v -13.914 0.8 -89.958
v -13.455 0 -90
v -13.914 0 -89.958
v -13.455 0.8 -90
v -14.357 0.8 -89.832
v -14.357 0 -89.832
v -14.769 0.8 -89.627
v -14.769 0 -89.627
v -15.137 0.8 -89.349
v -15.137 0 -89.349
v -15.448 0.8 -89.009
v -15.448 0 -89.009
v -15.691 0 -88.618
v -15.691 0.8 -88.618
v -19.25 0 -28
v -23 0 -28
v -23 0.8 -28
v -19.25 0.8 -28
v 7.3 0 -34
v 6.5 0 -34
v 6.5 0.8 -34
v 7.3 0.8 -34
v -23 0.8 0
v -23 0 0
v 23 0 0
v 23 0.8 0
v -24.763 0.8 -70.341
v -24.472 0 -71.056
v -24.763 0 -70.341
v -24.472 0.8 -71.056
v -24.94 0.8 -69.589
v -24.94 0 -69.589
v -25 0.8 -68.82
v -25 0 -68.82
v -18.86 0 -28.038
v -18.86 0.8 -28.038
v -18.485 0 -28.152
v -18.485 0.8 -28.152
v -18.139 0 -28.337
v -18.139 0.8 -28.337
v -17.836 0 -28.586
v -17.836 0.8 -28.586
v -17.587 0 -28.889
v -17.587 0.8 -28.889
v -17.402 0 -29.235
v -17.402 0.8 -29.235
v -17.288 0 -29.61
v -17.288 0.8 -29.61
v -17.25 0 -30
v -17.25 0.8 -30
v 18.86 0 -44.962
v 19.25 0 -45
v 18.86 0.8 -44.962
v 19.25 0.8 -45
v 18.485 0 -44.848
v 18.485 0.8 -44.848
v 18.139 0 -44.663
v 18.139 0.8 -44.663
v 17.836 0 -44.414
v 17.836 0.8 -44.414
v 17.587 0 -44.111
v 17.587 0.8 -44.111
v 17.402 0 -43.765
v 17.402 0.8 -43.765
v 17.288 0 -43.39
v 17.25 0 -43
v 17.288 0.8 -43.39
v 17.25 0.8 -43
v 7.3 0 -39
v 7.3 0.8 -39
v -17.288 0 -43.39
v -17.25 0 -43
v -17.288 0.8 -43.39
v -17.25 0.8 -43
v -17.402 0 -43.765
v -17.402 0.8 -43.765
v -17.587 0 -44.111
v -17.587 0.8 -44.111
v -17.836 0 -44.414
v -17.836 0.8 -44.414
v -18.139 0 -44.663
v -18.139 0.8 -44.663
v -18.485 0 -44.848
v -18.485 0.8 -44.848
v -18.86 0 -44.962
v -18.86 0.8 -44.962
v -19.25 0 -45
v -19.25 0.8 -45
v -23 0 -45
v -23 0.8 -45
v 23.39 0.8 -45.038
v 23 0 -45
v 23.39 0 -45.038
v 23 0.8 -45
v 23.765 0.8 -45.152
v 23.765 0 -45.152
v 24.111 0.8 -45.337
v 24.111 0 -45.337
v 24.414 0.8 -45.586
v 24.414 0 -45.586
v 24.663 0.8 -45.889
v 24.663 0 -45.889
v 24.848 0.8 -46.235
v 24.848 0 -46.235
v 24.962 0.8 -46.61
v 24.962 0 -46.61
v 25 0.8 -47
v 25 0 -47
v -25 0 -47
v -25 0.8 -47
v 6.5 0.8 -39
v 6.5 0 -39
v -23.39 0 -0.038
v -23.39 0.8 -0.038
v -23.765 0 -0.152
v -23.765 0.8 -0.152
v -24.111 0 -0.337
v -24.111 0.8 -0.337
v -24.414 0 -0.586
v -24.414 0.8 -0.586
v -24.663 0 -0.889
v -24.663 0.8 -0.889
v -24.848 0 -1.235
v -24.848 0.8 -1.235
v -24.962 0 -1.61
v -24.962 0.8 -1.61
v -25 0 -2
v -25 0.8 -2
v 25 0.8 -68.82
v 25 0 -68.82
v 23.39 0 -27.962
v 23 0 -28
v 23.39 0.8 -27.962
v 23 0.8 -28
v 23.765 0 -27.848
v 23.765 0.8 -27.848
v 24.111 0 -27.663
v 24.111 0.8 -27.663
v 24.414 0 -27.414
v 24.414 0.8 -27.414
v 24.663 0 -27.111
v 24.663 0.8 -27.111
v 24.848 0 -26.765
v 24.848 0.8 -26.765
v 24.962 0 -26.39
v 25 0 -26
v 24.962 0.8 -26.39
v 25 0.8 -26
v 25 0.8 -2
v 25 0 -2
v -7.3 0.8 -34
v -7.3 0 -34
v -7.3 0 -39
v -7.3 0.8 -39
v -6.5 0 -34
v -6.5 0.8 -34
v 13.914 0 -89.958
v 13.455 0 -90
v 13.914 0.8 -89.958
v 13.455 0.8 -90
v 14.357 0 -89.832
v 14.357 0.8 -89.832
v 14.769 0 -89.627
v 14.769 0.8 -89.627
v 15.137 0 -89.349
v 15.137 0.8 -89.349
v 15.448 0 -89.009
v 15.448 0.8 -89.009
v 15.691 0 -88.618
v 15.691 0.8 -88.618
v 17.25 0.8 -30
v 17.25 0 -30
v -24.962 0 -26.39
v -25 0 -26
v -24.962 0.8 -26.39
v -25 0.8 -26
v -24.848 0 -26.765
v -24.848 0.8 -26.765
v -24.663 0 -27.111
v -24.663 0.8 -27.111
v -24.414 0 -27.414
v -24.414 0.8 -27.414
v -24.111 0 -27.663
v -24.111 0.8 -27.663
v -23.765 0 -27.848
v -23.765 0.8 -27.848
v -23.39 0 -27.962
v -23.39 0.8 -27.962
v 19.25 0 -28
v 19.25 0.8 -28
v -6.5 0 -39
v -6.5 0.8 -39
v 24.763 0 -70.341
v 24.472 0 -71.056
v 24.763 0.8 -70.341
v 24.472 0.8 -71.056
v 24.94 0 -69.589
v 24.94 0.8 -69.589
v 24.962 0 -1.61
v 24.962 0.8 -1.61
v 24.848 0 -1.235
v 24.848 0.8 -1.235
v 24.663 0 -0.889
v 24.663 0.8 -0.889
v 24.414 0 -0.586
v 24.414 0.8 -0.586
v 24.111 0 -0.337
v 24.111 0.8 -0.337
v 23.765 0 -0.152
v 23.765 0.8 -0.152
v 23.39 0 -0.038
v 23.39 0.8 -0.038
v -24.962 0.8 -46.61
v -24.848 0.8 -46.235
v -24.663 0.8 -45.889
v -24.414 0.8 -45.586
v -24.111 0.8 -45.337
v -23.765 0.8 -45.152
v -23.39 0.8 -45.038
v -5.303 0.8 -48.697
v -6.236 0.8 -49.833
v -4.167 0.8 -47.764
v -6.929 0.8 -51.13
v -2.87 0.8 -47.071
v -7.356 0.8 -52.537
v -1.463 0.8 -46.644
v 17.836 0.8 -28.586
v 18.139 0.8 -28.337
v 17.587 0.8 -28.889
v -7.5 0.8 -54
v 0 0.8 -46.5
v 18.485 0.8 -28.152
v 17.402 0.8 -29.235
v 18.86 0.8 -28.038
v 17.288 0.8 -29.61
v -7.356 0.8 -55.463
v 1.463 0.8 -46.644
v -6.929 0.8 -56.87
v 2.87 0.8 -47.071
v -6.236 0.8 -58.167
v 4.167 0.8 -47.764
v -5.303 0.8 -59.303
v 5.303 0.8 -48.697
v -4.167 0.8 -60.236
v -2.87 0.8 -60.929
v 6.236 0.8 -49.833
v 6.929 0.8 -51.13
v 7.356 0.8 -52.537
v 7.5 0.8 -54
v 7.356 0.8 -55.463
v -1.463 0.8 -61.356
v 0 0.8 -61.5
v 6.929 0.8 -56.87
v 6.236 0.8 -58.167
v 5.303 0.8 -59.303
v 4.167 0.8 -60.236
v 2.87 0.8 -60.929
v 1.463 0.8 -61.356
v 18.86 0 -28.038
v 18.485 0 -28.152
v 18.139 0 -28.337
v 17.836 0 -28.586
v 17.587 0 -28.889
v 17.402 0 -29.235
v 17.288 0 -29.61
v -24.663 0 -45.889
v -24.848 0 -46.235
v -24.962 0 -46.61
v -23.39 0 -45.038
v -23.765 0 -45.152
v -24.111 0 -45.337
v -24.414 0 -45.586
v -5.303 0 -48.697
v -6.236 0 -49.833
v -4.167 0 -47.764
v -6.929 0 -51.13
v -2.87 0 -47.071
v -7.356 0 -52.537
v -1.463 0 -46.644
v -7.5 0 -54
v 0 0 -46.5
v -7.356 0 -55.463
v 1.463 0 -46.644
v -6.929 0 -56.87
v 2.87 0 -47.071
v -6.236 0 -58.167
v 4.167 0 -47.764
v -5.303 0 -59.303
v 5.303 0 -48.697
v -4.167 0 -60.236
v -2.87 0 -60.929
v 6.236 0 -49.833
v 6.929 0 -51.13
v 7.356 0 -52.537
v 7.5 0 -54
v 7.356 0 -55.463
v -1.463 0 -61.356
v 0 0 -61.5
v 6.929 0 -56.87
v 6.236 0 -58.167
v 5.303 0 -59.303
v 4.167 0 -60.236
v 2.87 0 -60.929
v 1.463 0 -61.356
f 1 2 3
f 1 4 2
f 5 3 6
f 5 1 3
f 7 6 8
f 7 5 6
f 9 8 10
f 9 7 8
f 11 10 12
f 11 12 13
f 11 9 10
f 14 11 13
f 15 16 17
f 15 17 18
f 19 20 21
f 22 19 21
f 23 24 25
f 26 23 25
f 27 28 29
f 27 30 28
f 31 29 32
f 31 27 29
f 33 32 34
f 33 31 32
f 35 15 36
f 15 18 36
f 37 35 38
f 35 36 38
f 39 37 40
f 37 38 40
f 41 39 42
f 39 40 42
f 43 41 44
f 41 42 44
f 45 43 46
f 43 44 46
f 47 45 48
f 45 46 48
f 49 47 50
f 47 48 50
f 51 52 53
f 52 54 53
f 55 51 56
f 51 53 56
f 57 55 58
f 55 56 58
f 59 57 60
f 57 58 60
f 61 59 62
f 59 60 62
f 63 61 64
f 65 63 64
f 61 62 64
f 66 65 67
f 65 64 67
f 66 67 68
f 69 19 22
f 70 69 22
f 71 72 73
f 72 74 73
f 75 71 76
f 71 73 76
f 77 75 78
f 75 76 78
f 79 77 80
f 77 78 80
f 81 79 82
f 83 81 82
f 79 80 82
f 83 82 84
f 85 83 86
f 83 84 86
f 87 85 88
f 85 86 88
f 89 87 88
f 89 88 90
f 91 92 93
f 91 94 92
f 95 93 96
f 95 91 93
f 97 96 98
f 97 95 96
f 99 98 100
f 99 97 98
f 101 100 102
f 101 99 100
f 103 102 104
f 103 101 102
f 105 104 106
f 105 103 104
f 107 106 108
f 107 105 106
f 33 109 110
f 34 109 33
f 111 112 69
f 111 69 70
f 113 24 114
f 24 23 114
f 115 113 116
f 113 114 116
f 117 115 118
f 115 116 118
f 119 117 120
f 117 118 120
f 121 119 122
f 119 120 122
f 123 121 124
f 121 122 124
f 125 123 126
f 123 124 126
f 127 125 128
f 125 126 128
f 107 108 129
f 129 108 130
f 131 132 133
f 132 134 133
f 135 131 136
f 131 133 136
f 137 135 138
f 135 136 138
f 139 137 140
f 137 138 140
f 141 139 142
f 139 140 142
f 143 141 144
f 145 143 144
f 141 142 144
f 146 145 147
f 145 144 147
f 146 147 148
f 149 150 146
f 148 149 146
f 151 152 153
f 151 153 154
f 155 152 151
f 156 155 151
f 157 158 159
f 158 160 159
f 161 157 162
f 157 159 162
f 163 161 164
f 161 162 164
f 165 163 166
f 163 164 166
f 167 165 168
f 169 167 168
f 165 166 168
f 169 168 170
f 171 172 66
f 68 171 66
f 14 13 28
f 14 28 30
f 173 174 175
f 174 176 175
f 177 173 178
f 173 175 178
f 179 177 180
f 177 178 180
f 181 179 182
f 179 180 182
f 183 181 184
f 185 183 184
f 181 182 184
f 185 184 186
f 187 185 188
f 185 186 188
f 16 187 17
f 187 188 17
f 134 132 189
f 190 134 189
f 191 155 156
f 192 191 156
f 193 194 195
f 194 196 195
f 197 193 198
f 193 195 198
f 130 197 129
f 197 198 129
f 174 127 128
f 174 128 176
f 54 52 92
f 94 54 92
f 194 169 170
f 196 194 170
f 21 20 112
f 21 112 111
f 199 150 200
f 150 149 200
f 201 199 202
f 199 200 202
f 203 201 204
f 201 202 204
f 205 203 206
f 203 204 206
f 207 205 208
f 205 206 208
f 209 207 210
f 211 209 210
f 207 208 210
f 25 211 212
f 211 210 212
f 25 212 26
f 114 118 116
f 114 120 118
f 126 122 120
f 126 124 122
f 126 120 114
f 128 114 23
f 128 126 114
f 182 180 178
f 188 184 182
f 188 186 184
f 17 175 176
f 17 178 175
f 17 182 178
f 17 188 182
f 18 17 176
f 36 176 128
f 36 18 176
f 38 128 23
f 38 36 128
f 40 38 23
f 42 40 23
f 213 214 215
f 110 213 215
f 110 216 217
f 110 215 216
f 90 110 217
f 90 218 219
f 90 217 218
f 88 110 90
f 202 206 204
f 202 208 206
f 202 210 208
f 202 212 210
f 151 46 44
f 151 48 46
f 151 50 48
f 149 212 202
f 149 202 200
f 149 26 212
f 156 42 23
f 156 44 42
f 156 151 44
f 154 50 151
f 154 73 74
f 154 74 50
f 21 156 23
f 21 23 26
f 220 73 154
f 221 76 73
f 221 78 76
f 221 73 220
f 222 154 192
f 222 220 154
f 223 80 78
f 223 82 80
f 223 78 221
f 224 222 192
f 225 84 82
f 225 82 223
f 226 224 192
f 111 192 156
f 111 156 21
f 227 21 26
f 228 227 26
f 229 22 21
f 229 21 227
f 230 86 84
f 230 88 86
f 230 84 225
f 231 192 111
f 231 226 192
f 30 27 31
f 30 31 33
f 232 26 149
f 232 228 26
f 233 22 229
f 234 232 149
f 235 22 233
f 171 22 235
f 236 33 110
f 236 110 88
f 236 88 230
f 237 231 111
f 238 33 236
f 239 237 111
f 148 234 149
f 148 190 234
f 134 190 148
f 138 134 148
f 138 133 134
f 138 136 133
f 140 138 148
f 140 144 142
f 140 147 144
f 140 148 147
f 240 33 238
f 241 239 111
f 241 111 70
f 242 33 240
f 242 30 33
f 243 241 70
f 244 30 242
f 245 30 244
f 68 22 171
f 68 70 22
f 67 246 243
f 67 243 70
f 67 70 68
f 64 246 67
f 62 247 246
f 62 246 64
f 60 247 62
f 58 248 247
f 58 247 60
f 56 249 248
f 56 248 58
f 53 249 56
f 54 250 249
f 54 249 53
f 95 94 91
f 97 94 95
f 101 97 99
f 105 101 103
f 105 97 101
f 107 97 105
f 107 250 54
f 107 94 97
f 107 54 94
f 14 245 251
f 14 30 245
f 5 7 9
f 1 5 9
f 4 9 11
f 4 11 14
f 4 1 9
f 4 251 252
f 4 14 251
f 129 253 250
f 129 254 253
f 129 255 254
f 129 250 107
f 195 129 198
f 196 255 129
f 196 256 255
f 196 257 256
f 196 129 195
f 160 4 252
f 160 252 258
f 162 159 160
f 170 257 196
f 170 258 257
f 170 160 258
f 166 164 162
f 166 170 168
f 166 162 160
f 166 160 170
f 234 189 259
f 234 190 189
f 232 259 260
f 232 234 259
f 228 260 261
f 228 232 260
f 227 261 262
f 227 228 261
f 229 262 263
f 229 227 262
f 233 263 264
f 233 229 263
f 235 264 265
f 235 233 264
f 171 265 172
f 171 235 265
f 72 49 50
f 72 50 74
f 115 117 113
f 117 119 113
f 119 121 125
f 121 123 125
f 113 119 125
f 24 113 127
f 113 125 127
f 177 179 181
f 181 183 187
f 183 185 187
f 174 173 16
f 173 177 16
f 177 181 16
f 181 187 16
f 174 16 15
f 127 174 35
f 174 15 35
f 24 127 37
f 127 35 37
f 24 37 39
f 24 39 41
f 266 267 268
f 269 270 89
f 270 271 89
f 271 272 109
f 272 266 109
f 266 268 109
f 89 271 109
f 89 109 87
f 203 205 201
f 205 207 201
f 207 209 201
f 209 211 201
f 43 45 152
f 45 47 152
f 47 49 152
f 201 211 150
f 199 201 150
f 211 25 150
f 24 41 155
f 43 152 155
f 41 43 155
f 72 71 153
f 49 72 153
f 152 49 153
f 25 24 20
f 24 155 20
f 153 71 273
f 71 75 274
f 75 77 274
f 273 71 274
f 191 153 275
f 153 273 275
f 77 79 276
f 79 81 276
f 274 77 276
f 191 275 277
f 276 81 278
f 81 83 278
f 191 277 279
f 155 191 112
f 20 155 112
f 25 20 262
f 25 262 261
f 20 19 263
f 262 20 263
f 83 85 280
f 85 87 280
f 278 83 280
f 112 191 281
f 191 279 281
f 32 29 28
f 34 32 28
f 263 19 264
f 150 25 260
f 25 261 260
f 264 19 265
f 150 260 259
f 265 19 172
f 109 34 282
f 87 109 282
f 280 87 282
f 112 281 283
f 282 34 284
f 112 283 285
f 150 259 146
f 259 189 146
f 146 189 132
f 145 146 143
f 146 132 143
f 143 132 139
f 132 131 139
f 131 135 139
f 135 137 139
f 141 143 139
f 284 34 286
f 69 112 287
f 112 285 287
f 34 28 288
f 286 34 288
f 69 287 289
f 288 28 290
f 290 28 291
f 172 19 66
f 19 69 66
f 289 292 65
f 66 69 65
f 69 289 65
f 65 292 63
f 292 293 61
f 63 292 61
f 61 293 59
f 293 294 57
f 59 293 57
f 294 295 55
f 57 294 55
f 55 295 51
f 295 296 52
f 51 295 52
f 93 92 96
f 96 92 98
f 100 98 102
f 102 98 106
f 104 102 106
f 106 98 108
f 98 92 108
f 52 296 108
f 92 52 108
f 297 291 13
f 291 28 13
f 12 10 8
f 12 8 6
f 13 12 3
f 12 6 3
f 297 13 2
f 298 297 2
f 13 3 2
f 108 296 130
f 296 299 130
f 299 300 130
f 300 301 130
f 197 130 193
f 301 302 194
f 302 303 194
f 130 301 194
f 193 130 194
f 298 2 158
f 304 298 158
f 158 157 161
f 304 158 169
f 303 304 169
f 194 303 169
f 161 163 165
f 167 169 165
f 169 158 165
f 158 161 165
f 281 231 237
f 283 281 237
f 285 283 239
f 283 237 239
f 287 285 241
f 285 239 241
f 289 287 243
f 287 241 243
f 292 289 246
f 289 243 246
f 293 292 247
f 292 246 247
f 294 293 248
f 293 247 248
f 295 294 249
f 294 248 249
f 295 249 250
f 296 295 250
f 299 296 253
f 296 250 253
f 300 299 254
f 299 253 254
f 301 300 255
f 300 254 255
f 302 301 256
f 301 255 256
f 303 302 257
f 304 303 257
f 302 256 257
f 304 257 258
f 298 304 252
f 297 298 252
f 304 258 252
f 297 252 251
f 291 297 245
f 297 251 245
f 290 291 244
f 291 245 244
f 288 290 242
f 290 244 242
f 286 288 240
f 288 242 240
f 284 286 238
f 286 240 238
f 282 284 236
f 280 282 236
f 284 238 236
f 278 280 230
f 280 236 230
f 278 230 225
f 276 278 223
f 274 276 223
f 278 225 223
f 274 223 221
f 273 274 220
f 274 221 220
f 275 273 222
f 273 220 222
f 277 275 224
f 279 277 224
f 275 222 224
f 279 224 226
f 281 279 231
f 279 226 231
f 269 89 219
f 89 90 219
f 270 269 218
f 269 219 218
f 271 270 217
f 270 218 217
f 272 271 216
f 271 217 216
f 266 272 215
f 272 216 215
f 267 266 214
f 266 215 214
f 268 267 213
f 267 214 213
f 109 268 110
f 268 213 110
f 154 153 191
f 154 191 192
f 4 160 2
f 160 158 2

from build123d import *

# Parameters (mm, degrees)
RESSALTO_EXTRUS_O1_DEPTH = 0.8
FILETE6_R                = 2
CHANFRO3_SIZE            = 10
CHANFRO3_SIZE2           = 20
CHANFRO4_SIZE            = 20
CHANFRO4_SIZE2           = 10
FILETE7_R                = 2.5
ESBO_O7_R                = 7.5
CORTE_EXTRUS_O1_DEPTH    = 0.8
CAVIDADE1_START          = -7.3
CAVIDADE1_OUTLINE_W      = 0.8
CAVIDADE1_OUTLINE_H      = 5
CAVIDADE1_DEPTH          = 0.8
CAVIDADE1_START_2        = 6.5
CAVIDADE1_2_OUTLINE_W    = 0.8
CAVIDADE1_2_OUTLINE_H    = 5
CAVIDADE1_2_DEPTH        = 0.8
FILETE8_R                = 5


# Read off the part's stored shape, not the designer's step: Cavidade1
with BuildPart() as part:
    # Esboço1 → Ressalto-extrusão1 (new body)
    with BuildSketch(Plane(origin=(0, 0, 0), x_dir=(1, 0, 0), z_dir=(0, 1, 0))):
        Polygon((-17.25, 45), (-25, 45), (-25, 90), (0, 90), (0, 0), (-25, 0), (-25, 28), (-17.25, 28), align=None)
    ressalto_extrus_o1 = extrude(amount=RESSALTO_EXTRUS_O1_DEPTH)

    # Espelhar8: Ressalto-extrusão1 across plane
    add(ressalto_extrus_o1.mirror(Plane(origin=(0, 0, 0), x_dir=(0, 0, 1), z_dir=(1, 0, 0))))

    # Filete6
    filete6_edges = [part.edges().sort_by_distance(p)[0] for p in [
        (-25, 0.4, -45),
        (-17.25, 0.4, -45),
        (-17.25, 0.4, -28),
        (-25, 0.4, -28),
        (-25, 0.4, 0),
        (25, 0.4, 0),
        (25, 0.4, -28),
        (17.25, 0.4, -28),
        (17.25, 0.4, -45),
        (25, 0.4, -45),
    ]]
    fillet(filete6_edges, radius=FILETE6_R)

    # Chanfro3
    chanfro3_edges = [part.edges().sort_by_distance(p)[0] for p in [
        (-25, 0.4, -90),
    ]]
    chanfro3_side = [part.faces().sort_by_distance(p)[0] for p in [
        (0, 0.4, -90),
    ]]
    chamfer(chanfro3_edges, length=CHANFRO3_SIZE, length2=CHANFRO3_SIZE2, reference=chanfro3_side[0])

    # Chanfro4
    chanfro4_edges = [part.edges().sort_by_distance(p)[0] for p in [
        (25, 0.4, -90),
    ]]
    chanfro4_side = [part.faces().sort_by_distance(p)[0] for p in [
        (25, 0.4, -68.5),
    ]]
    chamfer(chanfro4_edges, length=CHANFRO4_SIZE, length2=CHANFRO4_SIZE2, reference=chanfro4_side[0])

    # Filete7
    filete7_edges = [part.edges().sort_by_distance(p)[0] for p in [
        (-15, 0.4, -90),
        (15, 0.4, -90),
    ]]
    fillet(filete7_edges, radius=FILETE7_R)

    # Esboço7 → Corte-extrusão1 (cut)
    with BuildSketch(Plane(origin=(0, 0.8, 0), x_dir=(1, 0, 0), z_dir=(0, 1, 0))):
        with Locations(Location((0, 54, 0), (0, 0, 270))):
            Circle(ESBO_O7_R)
    extrude(amount=-CORTE_EXTRUS_O1_DEPTH, mode=Mode.SUBTRACT)

    # Cavidade1 outline → Cavidade1 (cut)
    with BuildSketch(Plane.YZ.offset(CAVIDADE1_START)):
        with Locations((0.4, -36.5)):
            Rectangle(CAVIDADE1_OUTLINE_W, CAVIDADE1_OUTLINE_H)
    extrude(amount=CAVIDADE1_DEPTH, mode=Mode.SUBTRACT)

    # Cavidade1 2 outline → Cavidade1 2 (cut)
    with BuildSketch(Plane.YZ.offset(CAVIDADE1_START_2)):
        with Locations((0.4, -36.5)):
            Rectangle(CAVIDADE1_2_OUTLINE_W, CAVIDADE1_2_OUTLINE_H)
    extrude(amount=CAVIDADE1_2_DEPTH, mode=Mode.SUBTRACT)

    # Filete8
    filete8_edges = [part.edges().sort_by_distance(p)[0] for p in [
        (-25, 0.4, -70),
        (25, 0.4, -70),
    ]]
    fillet(filete8_edges, radius=FILETE8_R)


solid = part.part
